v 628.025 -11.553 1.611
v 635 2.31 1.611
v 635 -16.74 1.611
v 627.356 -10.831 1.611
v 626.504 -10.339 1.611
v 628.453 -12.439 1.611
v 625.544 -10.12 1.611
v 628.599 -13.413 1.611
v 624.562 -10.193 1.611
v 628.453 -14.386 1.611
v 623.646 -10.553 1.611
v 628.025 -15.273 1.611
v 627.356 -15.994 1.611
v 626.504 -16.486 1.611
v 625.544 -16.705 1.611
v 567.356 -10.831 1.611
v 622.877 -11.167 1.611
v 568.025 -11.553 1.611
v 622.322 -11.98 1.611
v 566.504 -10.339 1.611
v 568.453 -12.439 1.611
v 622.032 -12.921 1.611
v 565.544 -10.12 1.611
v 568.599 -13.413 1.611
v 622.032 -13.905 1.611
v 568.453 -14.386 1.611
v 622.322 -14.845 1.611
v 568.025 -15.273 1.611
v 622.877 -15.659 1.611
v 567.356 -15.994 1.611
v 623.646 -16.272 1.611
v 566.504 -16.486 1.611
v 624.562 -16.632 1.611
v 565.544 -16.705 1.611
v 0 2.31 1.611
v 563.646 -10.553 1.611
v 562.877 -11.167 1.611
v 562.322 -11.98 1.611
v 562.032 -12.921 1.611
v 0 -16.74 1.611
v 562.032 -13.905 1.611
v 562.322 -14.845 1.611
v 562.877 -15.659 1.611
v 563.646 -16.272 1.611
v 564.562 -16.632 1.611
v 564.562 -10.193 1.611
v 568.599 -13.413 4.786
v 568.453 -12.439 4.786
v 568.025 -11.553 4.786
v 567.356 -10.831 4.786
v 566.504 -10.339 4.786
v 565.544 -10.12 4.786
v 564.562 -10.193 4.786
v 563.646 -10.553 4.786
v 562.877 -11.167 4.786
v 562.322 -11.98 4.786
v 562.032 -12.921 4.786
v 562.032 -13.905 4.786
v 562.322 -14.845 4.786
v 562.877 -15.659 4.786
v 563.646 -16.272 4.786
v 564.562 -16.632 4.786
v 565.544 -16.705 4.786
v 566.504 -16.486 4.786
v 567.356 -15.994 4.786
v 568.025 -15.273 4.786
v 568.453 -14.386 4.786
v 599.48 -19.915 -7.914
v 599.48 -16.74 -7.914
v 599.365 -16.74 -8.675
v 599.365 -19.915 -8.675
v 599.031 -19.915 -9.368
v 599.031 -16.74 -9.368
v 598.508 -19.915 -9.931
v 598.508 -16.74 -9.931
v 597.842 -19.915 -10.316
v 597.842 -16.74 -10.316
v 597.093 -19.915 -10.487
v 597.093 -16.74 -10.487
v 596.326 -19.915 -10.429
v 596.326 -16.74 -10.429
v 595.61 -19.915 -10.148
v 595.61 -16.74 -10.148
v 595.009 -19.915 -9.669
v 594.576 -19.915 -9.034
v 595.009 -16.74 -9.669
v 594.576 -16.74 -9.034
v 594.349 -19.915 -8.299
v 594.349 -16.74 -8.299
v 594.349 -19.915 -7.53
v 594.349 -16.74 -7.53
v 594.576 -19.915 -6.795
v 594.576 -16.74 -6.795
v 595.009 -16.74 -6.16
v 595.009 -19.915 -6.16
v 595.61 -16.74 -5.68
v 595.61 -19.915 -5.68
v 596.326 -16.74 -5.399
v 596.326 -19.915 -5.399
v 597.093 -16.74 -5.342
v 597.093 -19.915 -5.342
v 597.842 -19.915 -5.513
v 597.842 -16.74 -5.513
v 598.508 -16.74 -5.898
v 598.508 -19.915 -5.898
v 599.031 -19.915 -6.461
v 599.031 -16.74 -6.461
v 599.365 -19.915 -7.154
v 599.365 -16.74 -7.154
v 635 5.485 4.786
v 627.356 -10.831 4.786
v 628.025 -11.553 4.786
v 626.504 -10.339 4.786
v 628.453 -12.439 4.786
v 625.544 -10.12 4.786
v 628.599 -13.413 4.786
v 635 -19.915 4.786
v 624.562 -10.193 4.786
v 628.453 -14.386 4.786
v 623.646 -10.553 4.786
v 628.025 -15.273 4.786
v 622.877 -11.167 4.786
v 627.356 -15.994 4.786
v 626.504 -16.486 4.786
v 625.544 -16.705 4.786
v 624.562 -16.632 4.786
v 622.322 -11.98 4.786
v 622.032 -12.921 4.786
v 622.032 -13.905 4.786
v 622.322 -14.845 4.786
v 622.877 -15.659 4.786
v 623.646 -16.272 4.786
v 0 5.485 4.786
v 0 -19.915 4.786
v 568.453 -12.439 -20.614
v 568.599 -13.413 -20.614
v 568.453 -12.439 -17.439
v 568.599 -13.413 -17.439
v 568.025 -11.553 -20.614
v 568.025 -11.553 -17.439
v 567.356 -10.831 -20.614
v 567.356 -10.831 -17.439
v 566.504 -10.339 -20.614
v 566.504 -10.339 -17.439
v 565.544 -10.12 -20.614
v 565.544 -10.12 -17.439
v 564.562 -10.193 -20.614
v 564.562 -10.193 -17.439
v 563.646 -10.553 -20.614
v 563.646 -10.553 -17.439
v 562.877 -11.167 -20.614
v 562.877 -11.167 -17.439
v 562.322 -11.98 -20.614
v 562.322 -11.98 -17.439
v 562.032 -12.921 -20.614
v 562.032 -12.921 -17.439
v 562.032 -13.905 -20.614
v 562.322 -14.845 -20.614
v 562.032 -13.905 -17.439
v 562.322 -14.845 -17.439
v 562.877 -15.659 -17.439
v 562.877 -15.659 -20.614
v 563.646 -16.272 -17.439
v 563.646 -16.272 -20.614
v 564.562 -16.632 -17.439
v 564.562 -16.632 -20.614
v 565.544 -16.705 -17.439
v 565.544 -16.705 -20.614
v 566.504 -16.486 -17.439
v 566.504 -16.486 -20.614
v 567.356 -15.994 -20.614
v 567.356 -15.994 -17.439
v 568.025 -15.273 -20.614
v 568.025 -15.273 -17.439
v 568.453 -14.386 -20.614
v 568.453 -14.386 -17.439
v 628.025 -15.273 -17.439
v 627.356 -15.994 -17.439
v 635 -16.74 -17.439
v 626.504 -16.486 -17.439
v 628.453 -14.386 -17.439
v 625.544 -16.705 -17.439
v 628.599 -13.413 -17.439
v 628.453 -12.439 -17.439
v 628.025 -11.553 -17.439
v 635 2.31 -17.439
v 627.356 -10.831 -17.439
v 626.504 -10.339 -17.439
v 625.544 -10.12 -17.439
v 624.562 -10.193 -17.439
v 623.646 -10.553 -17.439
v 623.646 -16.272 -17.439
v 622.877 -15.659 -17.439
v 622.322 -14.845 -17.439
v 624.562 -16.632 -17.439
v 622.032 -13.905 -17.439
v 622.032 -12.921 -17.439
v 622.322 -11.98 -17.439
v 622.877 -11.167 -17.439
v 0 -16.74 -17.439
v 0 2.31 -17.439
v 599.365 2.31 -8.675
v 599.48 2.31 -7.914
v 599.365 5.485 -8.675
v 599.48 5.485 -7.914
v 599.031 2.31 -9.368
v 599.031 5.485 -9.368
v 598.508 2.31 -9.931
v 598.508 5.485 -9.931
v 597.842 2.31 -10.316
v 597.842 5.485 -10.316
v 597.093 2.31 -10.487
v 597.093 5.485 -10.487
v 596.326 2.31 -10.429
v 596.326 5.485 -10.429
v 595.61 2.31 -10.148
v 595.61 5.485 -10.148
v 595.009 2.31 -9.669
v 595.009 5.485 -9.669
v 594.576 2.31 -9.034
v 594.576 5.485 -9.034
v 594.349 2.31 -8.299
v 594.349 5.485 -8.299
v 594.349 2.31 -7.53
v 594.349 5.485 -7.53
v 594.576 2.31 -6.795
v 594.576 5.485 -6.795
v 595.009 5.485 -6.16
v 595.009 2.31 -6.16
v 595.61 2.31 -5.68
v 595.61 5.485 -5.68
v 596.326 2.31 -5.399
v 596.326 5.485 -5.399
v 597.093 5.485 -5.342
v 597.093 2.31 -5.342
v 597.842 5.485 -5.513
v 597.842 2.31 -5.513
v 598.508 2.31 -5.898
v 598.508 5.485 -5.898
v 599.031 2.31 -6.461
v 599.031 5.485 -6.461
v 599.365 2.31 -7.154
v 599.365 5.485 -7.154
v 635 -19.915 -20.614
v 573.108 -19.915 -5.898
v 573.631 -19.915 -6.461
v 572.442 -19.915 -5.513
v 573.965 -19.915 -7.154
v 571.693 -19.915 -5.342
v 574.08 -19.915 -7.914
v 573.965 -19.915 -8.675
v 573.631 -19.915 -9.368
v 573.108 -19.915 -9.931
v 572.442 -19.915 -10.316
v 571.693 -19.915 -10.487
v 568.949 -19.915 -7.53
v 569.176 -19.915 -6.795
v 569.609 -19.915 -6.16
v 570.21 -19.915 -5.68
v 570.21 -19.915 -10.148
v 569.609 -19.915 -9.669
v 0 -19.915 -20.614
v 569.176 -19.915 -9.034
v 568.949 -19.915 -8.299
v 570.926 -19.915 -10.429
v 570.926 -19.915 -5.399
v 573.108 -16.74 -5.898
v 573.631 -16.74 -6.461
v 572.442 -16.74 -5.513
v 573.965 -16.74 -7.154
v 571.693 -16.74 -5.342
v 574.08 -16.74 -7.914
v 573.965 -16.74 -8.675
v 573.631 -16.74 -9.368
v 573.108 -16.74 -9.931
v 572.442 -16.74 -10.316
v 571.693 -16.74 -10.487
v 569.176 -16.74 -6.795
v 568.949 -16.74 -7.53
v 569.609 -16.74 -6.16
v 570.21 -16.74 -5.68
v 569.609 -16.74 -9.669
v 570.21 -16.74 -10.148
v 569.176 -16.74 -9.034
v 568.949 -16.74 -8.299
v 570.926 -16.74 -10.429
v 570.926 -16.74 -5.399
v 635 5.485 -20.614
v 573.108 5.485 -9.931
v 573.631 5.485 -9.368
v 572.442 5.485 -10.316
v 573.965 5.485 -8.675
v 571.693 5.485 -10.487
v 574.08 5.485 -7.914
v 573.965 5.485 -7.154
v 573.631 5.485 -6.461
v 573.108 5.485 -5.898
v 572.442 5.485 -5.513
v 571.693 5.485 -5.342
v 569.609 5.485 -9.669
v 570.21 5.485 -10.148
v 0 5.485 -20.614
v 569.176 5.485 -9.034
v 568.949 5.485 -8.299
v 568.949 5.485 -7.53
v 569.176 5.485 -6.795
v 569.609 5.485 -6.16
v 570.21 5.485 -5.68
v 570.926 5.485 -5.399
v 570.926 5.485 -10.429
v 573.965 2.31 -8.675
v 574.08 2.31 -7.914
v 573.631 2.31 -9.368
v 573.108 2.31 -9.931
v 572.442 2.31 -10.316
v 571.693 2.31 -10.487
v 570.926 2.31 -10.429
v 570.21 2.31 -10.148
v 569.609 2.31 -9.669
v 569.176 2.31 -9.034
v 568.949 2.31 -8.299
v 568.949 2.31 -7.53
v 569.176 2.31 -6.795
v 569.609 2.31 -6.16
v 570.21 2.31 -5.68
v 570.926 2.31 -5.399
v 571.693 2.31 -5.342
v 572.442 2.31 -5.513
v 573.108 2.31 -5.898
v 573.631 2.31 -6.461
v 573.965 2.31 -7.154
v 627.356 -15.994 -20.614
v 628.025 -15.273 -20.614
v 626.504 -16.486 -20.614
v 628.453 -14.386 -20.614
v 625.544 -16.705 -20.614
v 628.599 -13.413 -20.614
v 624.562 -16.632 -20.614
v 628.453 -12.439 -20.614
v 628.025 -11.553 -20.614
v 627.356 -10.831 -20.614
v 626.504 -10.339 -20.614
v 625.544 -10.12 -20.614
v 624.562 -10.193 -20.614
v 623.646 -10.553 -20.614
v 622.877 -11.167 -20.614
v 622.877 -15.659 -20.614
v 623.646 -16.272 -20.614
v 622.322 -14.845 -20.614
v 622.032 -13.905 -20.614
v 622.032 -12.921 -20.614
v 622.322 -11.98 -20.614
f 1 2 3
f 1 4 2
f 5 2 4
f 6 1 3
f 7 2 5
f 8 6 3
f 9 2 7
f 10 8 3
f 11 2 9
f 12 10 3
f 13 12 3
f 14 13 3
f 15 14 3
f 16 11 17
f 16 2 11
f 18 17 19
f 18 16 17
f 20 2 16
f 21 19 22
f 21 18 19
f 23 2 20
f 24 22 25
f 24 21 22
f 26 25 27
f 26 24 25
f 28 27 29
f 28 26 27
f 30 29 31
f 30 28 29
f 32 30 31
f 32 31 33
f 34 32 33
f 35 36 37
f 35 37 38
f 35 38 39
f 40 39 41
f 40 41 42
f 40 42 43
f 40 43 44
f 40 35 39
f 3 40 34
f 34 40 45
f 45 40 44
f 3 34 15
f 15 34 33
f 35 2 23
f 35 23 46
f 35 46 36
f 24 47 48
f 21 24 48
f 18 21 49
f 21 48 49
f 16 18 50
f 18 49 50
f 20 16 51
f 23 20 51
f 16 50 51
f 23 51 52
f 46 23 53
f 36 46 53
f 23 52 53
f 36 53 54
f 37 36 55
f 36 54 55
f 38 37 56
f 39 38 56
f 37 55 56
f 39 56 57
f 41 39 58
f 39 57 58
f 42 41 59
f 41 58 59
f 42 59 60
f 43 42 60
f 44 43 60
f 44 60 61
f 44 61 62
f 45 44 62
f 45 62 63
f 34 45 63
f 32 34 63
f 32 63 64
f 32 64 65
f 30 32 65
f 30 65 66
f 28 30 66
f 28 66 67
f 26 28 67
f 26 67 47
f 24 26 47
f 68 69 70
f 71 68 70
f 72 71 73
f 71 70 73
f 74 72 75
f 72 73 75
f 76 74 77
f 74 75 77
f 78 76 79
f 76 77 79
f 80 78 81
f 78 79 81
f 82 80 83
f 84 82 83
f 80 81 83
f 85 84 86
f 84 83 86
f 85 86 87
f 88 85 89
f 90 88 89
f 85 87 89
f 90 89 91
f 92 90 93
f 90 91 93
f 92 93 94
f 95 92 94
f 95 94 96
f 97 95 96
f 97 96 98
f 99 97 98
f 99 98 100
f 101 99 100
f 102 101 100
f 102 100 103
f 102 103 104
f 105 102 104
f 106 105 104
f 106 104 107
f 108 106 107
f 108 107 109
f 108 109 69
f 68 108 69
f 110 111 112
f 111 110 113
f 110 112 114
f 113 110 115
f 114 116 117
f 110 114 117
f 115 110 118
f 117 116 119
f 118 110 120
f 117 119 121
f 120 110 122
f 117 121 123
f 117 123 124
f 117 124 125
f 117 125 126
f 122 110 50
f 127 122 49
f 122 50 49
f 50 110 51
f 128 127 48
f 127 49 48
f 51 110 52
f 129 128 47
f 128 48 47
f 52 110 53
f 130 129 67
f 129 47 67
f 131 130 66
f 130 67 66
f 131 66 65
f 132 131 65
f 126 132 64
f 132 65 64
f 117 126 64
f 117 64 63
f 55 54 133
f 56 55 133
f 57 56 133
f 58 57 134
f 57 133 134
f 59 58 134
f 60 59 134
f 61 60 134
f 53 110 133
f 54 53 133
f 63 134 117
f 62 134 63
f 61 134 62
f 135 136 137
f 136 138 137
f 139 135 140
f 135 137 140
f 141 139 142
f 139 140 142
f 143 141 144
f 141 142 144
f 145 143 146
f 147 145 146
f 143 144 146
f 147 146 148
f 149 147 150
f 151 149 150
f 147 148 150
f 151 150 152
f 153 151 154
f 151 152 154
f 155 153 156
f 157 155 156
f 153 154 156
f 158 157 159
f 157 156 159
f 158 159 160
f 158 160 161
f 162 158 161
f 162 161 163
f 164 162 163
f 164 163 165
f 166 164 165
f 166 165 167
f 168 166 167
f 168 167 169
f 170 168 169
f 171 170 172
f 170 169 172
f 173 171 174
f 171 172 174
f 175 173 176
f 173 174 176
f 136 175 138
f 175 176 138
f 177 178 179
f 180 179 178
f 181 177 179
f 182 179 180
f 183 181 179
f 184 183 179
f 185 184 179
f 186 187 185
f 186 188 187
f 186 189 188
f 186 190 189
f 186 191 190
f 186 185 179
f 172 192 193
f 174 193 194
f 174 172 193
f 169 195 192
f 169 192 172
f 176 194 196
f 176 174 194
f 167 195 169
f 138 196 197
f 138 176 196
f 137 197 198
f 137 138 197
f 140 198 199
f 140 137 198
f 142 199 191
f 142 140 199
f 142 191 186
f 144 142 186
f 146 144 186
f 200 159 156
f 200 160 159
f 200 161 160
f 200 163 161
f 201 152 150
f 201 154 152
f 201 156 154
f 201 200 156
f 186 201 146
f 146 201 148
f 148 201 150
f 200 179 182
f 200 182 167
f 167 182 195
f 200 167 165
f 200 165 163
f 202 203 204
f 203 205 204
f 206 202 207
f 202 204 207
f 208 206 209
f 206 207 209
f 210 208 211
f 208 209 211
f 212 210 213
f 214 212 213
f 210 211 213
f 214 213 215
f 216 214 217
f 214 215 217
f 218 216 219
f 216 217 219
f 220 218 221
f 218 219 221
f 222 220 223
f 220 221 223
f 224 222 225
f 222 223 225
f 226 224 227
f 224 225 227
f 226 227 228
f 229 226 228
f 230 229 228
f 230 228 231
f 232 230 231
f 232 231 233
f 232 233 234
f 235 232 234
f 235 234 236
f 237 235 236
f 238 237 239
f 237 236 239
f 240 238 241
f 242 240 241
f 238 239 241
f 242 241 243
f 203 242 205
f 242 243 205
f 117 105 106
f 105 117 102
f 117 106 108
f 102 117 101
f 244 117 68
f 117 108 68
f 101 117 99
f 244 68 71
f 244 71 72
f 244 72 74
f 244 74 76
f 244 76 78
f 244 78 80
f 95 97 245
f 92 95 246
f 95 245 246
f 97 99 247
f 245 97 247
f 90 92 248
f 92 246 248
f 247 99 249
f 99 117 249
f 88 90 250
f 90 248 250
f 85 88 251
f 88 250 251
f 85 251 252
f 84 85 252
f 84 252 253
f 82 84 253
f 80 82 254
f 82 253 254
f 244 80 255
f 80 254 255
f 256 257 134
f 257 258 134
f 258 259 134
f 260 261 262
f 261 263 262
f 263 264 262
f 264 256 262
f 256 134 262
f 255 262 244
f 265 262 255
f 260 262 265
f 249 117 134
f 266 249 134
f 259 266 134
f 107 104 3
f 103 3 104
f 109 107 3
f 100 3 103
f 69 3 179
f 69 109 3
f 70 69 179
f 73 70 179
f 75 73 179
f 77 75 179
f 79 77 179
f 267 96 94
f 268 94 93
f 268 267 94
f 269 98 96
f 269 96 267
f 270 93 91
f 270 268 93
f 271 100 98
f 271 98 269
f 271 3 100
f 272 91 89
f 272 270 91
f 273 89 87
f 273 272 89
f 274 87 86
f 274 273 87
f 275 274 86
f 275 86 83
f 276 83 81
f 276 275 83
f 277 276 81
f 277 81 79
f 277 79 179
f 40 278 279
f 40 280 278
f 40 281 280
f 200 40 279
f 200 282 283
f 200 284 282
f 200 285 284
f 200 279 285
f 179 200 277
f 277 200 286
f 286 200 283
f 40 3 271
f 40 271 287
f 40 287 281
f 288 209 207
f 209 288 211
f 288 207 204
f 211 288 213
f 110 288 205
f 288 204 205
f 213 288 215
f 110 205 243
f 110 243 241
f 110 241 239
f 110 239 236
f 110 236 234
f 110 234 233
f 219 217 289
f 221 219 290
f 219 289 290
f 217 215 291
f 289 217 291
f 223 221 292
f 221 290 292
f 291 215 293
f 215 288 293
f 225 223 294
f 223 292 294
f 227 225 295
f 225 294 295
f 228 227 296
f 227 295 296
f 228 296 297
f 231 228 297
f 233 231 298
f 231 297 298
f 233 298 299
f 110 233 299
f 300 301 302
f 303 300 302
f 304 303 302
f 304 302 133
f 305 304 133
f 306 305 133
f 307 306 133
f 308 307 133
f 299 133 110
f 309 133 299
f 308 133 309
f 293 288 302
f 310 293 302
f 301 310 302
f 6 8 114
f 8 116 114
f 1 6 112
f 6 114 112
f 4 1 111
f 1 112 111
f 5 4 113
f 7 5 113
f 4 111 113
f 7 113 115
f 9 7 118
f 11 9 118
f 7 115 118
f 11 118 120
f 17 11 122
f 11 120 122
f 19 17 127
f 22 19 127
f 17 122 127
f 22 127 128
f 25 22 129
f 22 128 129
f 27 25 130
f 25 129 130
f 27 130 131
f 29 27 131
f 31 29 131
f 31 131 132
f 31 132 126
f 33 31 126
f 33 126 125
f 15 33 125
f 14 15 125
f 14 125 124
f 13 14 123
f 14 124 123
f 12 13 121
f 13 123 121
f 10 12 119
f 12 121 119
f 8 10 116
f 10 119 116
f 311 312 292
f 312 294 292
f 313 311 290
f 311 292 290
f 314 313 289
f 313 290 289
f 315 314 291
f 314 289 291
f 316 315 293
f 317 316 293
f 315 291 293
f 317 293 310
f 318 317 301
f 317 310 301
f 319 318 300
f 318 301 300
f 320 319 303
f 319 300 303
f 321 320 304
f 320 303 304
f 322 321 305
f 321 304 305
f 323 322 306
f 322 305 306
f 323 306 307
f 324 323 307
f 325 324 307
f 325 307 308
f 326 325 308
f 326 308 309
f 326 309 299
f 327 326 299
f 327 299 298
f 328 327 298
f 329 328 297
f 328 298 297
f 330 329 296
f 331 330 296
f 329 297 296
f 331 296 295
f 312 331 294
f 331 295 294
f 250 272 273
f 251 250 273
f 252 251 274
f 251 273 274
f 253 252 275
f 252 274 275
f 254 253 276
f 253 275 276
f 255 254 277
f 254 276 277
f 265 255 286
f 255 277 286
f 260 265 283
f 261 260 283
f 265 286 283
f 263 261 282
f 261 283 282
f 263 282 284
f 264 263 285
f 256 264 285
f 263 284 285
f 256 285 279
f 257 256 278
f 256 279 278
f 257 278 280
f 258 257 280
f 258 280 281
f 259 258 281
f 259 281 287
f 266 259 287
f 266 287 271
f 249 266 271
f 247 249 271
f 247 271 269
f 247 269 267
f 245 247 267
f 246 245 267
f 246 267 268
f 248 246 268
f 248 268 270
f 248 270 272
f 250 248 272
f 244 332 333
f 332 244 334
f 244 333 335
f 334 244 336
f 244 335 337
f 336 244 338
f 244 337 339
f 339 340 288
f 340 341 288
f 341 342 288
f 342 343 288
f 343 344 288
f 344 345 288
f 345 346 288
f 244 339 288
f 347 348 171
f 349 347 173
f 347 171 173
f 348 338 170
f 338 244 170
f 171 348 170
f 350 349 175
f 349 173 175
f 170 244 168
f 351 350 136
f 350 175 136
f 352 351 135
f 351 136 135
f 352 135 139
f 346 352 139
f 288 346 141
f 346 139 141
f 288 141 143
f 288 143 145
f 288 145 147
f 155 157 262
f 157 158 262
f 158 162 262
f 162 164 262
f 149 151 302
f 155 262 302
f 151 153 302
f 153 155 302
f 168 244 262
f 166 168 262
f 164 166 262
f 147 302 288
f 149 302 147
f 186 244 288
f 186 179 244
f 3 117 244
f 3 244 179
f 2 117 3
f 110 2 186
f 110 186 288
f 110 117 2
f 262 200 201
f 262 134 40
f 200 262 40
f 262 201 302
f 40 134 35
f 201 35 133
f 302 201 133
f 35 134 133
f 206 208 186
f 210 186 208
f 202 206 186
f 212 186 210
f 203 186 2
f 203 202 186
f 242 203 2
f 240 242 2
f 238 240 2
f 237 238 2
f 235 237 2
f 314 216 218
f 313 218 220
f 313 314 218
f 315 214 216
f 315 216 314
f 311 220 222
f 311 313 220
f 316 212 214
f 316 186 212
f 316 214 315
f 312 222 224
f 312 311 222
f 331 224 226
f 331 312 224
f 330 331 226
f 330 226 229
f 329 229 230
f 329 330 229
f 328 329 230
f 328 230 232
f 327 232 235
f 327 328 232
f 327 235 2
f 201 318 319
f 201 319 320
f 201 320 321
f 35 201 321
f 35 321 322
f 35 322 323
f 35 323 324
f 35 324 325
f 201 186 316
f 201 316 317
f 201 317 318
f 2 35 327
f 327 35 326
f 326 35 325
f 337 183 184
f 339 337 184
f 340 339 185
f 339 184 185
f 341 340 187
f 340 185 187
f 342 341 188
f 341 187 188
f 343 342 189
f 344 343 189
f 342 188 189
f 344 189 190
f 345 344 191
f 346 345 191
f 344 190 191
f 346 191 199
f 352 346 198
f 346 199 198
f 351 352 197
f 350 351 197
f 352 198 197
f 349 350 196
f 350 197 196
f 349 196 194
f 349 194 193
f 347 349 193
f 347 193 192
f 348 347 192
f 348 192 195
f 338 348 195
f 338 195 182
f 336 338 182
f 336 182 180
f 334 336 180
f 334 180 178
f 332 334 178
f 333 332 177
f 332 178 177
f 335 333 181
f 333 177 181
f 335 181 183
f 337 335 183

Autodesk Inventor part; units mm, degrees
ref_plane "YZ Plane" through (0, 0, 0) normal (1, 0, 0) x (0, 1, 0)
ref_plane "XZ Plane" through (0, 0, 0) normal (0, 1, 0) x (-1, 0, 0)
ref_plane "XY Plane" through (0, 0, 0) normal (0, 0, 1) x (1, 0, 0)
sketch "Sketch1" plane through (0, 0, 0) normal (1, 0, 0) x (0, 1, 0)
  line L0 (5.4849, 4.7856) -> (-19.9151, 4.7856)
  line L1 (-19.9151, 4.7856) -> (-19.9151, -20.6144)
  line L2 (-19.9151, -20.6144) -> (5.4849, -20.6144)
  line L3 (5.4849, -20.6144) -> (5.4849, 4.7856)
  line L4 (2.3099, 1.6106) -> (-16.7401, 1.6106)
  line L5 (-16.7401, 1.6106) -> (-16.7401, -17.4394)
  line L6 (-16.7401, -17.4394) -> (2.3099, -17.4394)
  line L7 (2.3099, -17.4394) -> (2.3099, 1.6106)
  point P0 (0, 0)
  dimension "d0" = 25.4
  dimension "d1" = 25.4
  dimension "d2" = 3.175
extrude "Extrusion1" add sketch "Sketch1" along normal blind 635
sketch "Sketch4" plane through (0, -19.9151, 4.7856) normal (0, 0, 1) x (1, 0, 0)
  line L0 (0, 25.4) -> (0, 0) construction
  line L1 (0, 0) -> (0, 6.5024) construction
  line L2 (0, 6.5024) -> (625.2972, 6.5024) construction
  circle A0 centre (625.2972, 6.5024) radius 3.302
  point P0 (0, 19.9151)
  dimension "d19" = 6.5024
  dimension "d20" = 625.2972
  dimension "d21" = 6.604
extrude "Extrusion5" cut sketch "Sketch4" against normal blind 25.4
sketch "Sketch5" plane through (0, 5.4849, 4.7856) normal (0, 1, 0) x (1, 0, 0)
  line L0 (635, 22.225) -> (635, 3.175) construction
  line L1 (635, 12.7) -> (558.8, 12.7) construction
  line L2 (558.8, 12.7) -> (571.5, 12.7) construction
  line L3 (571.5, 12.7) -> (596.9, 12.7) construction
  circle A0 centre (571.5, 12.7) radius 2.5797
  circle A1 centre (596.9, 12.7) radius 2.5797
  point P0 (0, 4.7856)
  dimension "d26" = 76.2
  dimension "d27" = 12.7
  dimension "d28" = 25.4
  dimension "d29" = 5.1594
  dimension "d30" = 5.1594
extrude "Extrusion6" cut sketch "Sketch5" against normal blind 25.4
sketch "Sketch7" plane through (0, -19.9151, 4.7856) normal (0, 0, 1) x (1, 0, 0)
  circle A0 centre (625.2972, 6.5024) radius 3.302 projected
  circle A1 centre (565.2972, 6.5024) radius 3.302
  line L0 (565.2972, 6.5024) -> (625.2972, 6.5024) construction
  point P0 (0, 19.9151)
  dimension "d34" = 6.604
extrude "Extrusion7" cut sketch "Sketch7" against normal blind 25.4 contours A1
properties part number "23in 1x1 Beam"
